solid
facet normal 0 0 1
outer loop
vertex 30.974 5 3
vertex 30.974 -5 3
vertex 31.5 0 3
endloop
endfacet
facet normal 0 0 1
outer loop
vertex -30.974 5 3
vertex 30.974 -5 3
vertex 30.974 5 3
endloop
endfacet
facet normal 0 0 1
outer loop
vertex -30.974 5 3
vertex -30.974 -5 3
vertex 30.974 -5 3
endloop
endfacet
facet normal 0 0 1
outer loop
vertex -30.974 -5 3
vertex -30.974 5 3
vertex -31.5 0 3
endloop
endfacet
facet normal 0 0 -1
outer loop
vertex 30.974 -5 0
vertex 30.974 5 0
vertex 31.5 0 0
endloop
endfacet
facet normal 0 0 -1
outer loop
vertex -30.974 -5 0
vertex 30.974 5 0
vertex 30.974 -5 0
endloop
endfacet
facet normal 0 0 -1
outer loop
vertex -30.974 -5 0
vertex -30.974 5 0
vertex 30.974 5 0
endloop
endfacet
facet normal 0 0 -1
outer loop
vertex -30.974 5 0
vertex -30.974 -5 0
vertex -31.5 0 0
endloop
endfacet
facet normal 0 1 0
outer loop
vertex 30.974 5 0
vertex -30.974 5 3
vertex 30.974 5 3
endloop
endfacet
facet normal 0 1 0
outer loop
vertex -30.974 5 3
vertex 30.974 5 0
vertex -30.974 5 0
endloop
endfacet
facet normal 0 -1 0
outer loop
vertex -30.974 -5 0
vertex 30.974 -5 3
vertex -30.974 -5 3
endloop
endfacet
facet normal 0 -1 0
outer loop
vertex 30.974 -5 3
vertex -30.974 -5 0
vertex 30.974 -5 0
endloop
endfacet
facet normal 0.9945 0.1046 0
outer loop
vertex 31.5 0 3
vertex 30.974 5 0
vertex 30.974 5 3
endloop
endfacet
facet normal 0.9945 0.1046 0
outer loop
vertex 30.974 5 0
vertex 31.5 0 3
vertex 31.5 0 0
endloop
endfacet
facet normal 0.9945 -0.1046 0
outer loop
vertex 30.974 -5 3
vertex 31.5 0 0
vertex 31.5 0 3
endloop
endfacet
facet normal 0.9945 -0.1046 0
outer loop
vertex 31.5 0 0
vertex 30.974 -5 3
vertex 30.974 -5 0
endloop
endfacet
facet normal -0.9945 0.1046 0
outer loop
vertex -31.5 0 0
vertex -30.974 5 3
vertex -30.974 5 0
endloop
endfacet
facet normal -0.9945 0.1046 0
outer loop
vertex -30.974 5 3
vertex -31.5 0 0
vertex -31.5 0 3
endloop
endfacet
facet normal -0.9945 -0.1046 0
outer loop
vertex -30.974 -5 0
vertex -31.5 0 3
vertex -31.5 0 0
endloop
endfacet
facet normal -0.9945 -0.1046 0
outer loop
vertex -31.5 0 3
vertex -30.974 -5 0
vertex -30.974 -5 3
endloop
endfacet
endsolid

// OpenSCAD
/*-------------------------------------------------------------------------\
Tab n Slot module

Author: SimCity


A simple module to generate tabs and slots to make 2 objects interlock
Use slots(); with a difference to cut grooves
Use tab(); with a union to add tabs to the other object

just about everything I could think of is panametric, just watch that you don't set certain values to numbers that wouldn't work. Most of these are simple math to avoid.

To Do: currently generating 2 or more tabs cannont be compliled to look right but renders fine. Need to fix this to make life easier
Stops are not implemented so have to make own if groove protrude out the other side of the object
Need to add some error code to stop the use of values that will result in slots longer than possible and tabs that are too big for there to be enough room for grooves.
\----------------------------------------------------------------------------*/

// Display Tabs or Slots? (Note: Slots generates what is to be cut away)
part=1; //[1:Tabs,0:Slots]

//diameter of center hole which everything rotates around
center_hole=55;
//turn on or off removing material from the center hole (broken atm)
cut_hole=0; //[0:Disabled,1:Enabled]
//how far you want to go in before turning
insert_depth=10;
//how deep to cut the groove (In other terms ho much should the tabs stick out by)
groove_depth=4;
//Ho wide should the groove be (Or in other terms how thick to make the tabs)
groove_width=3; 
//width of tab (Good idea to not make this more than Radius)
tab_width=10; 
//how far to rotate to lock, never set to more than 360/Tab Number
rotation=25; 
//Number of tabs, don't recommend using 1 for physical use but is handy for testing things
tab_number=2; //[2:10]
//self explanetry really, this will be dependant on printer
tollerance=0.2;
//which way you want to rotate, set to 0 for anti-clockwise
direction=1; //[1:Clockwise,0:Counter-Clockwise]
//use this if the center_hole is larger than the object that will have the tabs to extend them
gap=10;
//this adds a little indent and nub at the final resting point to make it harder to turn back, adjust to a value that is not too big just enough to make it click into place. Takes a bit of fine tuning
lock=0; 
//Use if slots material is going to be thinner than groove thickness to add a stop to edge of tab. Untested
stop=0; //[0:Disabled,1:Enabled]

//enable to remove any material that is in the arc the tabs will rotate through, not needed if cut_hole is set true
tab_clearance=0; //[0:Disabled,1:Enabled]


//test tabs
if (part){
union(){
//cylinder(r=center_hole/2, h=insert_depth);
tabs();
}
}
else{
//test slots

difference(){
translate([0,0,insert_depth/2-5])
cube([center_hole+groove_depth*2+40,center_hole+groove_depth*2+40,insert_depth+10],center=true);
//cylinder(r=center_hole/2, h=insert_depth+15,center=true);
slots();
}
}    
  

//math, leave commented (its in the modules only noted here for reference)
//a=center_hole+2*groove_depth+10;
//b=center_hole/2+groove_depth;
//c=tab_width/2+tollerance;

module slots(

center_hole=center_hole,
cut_hole=cut_hole,
insert_depth=insert_depth,
groove_depth=groove_depth,
groove_width=groove_width,
tab_width=tab_width,
rotation=rotation,
tab_number=tab_number,
tollerance=tollerance,
direction=direction,
gap=gap,
lock=lock,
stop=stop,
tab_clearance=tab_clearance

){

a=center_hole+2*groove_depth+10;
b=center_hole/2+groove_depth;
c=tab_width/2+tollerance;

	union(){
		for(i = [0:tab_number]){
			rotate((360/tab_number)*i)
			union(){
				difference(){
					cylinder(r=b, h=insert_depth);
					rotate(-rotation*(direction))
					translate([-a/2,c,-5])
					cube([a,b,insert_depth+10]);
					rotate(rotation*(1-direction))
					translate([-a/2,-c-b-10,-5])
					cube([a,b+10,insert_depth+10]);
					if(tab_clearance){
						translate([0,0,groove_width+2*tollerance])
						difference(){
							cylinder(r=b+5, h=insert_depth);
							cylinder(r=center_hole/2, h=insert_depth+10,center=true);
							translate([-a/2,(2*+c*direction)-c-b-10,-5])
							cube([a,b+10,insert_depth+10]);
						}
					}else {
						translate([-a/2,(2*c*direction)-c,groove_width+2*tollerance])
						cube([a,b+10,insert_depth]);
					}
					rotate([0,90,rotation*(direction)+90])
					cylinder(r=lock, h=center_hole+groove_depth+10);
				}
			}
		}
		if (cut_hole)
		cylinder(r=center_hole/2, h=insert_depth);
	}
}


module tabs(

center_hole=center_hole,
insert_depth=insert_depth,
groove_depth=groove_depth,
groove_width=groove_width,
tab_width=tab_width,
tab_number=tab_number,
tollerance=tollerance,
direction=direction,
gap=gap,
lock=lock,
stop=stop

){

a=center_hole+2*groove_depth+10;
b=center_hole/2+groove_depth;
c=tab_width/2+tollerance;

	intersection(){
		cylinder(r=b, h=insert_depth);
		for(i = [0:tab_number]){
		rotate((360/tab_number)*i)
            
            difference(){
                union(){

                    translate([0,-tab_width/2,0])
                    cube([center_hole+groove_depth,tab_width,groove_width]);
                    if(stop){
                        translate([(center_hole+groove_depth)/2,(tab_width/2-(groove_width/4))*(direction?1:-1),groove_width])
                        cube([center_hole+groove_depth,groove_width/2,groove_width],center=true); 
                    }
                }
                rotate([0,90,0])
                cylinder(r=lock, h=center_hole+groove_depth+10);
                translate([0,0,-5])
                if (cut_hole)
                cylinder(r=(center_hole/2)-tollerance-gap, h=groove_width+10);
            }

		}
	}
}

